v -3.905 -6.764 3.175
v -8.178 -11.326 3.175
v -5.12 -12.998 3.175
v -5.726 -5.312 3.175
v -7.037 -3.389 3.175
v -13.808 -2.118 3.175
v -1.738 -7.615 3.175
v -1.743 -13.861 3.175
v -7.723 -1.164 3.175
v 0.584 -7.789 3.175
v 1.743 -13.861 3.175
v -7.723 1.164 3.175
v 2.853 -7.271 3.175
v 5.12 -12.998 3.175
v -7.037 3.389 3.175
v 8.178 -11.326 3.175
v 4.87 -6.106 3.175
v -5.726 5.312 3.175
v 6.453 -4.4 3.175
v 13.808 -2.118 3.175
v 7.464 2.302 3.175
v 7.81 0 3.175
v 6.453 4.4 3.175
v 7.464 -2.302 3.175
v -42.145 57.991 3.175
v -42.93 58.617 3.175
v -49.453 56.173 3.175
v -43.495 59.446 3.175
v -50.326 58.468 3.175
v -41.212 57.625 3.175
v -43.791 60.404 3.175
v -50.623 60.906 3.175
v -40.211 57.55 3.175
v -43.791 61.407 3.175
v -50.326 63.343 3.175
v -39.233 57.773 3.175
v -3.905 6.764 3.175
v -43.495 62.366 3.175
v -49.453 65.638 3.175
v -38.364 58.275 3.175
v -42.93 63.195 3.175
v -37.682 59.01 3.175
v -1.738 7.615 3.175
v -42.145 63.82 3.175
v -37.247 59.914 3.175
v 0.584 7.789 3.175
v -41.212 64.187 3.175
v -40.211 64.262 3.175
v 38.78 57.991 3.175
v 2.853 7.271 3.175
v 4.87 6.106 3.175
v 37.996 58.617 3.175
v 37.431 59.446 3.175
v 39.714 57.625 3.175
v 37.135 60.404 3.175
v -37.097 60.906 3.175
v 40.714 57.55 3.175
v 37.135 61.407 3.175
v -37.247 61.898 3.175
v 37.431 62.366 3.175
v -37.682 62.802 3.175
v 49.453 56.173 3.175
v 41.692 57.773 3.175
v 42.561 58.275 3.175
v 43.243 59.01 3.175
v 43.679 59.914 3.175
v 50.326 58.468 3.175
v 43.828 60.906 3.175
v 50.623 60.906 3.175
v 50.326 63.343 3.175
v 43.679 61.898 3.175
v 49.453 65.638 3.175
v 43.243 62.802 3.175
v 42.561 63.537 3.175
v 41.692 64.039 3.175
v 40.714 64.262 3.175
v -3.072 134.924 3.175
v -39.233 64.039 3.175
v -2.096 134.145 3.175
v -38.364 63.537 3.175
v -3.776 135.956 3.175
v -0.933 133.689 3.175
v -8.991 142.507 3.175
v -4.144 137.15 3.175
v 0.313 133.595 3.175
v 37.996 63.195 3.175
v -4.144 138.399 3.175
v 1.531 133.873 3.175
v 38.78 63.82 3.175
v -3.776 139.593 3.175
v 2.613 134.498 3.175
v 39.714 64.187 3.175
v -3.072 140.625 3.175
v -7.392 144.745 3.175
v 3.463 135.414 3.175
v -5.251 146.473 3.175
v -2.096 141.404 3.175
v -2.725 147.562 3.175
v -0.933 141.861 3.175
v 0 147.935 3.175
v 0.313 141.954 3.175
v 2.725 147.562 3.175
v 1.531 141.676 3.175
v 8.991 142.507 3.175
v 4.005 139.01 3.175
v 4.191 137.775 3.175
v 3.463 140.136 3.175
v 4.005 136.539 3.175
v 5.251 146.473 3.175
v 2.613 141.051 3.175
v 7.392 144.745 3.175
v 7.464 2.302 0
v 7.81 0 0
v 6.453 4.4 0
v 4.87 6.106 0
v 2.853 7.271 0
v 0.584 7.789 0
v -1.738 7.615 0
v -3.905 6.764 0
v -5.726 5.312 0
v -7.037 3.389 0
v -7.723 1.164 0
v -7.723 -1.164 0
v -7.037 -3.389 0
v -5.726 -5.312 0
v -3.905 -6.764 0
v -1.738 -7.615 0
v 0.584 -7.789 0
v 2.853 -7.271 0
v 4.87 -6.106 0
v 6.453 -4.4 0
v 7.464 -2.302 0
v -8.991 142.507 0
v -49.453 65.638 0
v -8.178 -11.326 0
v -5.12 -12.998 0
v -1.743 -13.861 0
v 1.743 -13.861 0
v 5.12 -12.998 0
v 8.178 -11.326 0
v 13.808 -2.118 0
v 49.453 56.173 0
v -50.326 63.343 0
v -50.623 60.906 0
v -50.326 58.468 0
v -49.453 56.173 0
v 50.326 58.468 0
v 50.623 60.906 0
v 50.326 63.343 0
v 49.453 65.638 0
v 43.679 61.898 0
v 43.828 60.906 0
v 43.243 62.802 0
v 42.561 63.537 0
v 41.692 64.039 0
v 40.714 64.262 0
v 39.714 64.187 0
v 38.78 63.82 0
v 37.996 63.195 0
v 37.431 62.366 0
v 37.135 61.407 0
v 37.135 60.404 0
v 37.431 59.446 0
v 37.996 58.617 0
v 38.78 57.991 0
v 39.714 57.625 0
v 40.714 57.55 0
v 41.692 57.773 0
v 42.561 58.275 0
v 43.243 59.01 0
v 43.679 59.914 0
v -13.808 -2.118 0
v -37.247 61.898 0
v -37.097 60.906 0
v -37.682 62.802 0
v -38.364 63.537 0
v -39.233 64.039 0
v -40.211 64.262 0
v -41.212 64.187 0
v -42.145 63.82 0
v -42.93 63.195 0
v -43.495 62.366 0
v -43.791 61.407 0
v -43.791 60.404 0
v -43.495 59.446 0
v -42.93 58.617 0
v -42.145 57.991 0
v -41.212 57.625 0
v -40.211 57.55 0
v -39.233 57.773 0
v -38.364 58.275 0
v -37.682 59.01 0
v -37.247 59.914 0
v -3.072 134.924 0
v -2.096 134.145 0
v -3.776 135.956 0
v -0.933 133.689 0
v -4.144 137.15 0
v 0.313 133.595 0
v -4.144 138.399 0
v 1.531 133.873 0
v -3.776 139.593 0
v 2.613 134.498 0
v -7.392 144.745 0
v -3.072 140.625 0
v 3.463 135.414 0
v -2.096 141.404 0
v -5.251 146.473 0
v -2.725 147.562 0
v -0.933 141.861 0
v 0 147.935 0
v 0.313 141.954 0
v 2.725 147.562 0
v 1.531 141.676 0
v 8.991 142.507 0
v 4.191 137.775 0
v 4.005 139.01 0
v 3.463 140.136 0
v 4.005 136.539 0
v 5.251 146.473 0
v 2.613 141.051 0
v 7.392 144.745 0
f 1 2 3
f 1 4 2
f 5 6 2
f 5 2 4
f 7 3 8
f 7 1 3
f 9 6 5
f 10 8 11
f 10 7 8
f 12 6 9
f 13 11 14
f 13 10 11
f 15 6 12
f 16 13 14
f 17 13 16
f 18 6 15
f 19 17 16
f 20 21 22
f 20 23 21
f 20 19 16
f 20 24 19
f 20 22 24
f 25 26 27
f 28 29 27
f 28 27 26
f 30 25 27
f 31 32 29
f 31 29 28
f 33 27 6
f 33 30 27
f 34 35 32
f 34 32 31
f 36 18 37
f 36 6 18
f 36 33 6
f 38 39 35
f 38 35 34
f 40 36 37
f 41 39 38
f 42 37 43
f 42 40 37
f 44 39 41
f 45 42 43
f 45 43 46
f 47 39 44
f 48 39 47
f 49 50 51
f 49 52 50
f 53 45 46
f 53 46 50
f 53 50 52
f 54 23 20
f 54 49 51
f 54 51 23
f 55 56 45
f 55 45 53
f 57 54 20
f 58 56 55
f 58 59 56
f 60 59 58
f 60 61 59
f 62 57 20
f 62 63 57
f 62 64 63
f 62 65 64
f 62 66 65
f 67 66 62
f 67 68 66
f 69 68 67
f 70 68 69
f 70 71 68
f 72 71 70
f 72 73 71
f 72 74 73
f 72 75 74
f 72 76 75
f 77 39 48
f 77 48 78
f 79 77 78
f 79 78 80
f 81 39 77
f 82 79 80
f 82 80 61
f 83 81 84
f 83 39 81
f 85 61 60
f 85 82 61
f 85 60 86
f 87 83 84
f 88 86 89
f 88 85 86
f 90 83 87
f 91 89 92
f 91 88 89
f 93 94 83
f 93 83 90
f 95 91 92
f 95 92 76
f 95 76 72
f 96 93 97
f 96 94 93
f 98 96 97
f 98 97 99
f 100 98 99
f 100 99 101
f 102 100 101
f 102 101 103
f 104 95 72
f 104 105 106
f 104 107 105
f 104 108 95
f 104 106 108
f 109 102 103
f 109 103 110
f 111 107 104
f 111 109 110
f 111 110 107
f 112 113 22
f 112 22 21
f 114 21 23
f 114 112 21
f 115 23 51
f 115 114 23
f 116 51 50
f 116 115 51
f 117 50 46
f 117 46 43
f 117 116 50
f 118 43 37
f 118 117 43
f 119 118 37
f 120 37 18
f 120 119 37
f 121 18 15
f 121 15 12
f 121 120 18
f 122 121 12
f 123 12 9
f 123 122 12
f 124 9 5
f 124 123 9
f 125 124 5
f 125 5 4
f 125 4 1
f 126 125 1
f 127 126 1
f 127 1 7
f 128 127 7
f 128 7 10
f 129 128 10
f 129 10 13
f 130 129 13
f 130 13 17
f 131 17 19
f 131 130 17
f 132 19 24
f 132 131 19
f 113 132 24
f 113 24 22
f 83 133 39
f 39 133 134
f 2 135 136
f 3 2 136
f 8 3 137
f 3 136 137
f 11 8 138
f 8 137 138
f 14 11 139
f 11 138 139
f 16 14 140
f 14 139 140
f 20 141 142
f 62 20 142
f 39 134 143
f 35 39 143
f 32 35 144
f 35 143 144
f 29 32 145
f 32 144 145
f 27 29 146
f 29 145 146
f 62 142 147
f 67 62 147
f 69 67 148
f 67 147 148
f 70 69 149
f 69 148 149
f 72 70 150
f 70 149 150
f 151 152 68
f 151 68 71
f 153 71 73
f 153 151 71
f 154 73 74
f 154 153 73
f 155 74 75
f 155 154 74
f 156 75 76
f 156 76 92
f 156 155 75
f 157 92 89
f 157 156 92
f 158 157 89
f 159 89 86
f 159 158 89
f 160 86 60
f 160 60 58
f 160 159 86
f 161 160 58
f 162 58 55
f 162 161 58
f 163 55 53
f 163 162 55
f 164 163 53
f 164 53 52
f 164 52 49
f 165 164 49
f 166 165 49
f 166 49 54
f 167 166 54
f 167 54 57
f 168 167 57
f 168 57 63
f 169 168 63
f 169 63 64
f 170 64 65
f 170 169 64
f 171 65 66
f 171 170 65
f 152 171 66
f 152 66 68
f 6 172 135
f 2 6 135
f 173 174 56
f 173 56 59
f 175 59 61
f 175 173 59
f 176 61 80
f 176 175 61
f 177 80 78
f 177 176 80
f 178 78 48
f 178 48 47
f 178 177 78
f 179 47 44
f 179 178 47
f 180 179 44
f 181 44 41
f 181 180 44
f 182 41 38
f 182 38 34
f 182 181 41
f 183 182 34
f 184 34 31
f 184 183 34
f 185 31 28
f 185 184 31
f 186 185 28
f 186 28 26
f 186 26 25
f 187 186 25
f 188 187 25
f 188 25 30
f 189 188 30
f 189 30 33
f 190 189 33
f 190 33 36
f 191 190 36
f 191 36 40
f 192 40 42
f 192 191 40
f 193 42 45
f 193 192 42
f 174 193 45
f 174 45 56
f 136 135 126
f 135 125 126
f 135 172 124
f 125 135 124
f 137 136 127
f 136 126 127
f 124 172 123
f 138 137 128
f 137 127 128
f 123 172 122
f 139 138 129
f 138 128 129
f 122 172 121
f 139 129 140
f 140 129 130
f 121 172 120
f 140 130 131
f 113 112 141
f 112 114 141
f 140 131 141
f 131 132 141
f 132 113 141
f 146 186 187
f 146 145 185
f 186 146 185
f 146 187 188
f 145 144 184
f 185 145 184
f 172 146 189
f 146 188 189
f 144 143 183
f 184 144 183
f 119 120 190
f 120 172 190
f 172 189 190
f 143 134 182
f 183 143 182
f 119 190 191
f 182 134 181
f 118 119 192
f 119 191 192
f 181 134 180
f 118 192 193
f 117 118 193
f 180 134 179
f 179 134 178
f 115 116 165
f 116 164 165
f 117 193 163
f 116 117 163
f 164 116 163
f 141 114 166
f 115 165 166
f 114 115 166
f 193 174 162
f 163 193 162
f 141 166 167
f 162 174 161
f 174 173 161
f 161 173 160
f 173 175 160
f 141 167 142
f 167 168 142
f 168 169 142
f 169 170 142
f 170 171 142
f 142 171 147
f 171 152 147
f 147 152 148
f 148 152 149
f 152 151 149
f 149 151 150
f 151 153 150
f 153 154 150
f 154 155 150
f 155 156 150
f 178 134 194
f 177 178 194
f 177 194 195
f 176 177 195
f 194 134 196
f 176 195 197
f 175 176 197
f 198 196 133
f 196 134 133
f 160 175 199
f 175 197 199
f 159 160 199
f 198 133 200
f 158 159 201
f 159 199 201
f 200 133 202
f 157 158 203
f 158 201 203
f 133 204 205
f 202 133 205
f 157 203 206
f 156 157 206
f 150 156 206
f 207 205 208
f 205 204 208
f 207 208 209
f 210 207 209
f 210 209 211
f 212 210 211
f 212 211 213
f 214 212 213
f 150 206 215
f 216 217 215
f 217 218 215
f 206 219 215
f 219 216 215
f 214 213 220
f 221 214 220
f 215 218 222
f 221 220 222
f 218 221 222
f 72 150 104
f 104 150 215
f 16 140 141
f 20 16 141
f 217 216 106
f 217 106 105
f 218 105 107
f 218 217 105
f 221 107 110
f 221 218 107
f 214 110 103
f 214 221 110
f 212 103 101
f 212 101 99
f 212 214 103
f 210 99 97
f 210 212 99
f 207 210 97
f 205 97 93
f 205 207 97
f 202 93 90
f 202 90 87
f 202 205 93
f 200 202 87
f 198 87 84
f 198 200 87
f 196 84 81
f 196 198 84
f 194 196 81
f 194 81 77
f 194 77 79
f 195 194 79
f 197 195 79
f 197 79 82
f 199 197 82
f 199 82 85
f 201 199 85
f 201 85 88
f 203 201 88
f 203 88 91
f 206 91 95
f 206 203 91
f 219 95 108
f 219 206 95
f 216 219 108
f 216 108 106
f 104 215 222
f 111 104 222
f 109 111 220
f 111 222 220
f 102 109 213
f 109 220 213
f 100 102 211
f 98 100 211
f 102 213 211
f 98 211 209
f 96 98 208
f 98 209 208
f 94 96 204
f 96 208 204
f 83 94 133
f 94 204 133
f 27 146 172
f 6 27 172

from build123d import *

# Parameters (mm, degrees)
SKETCH4_R           = 3.3655
SKETCH4_R_2         = 7.8105
SKETCH4_R_3         = 4.191
BOSS_EXTRUDE4_DEPTH = 3.175


with BuildPart() as part:
    # Sketch4 → Boss-Extrude4 (new body)
    # profile 1 of 3: a face of its own
    with BuildSketch(Plane.XY):
        with BuildLine():
            ThreePointArc((-10.16, 137.77468), (-9.863294022, 140.212103033), (-8.990505701, 142.507164257))
            Line((-8.990505701, 142.507164257), (-49.453246099, 65.638340515))
            ThreePointArc((-49.453246099, 65.638340515), (-50.622740399, 60.905856258), (-49.453246099, 56.173372001))
            Line((-49.453246099, 56.173372001), (-13.808489628, -2.118139324))
            ThreePointArc((-13.808489628, -2.118139324), (-13.929563886, -1.062144034), (-13.97, 0))
            Line((-13.97, 0), (-10.16, 137.77468))
        make_face()
        with Locations((-40.462740399, 60.905856258)):
            Circle(SKETCH4_R, mode=Mode.SUBTRACT)
    # profile 2 of 3: a face of its own
    with BuildSketch(Plane.XY):
        with BuildLine():
            ThreePointArc((49.453246099, 56.173372001), (50.622740399, 60.905856258), (49.453246099, 65.638340515))
            Line((49.453246099, 65.638340515), (8.990505701, 142.507164257))
            ThreePointArc((8.990505701, 142.507164257), (9.863294022, 140.212103033), (10.16, 137.77468))
            Line((10.16, 137.77468), (13.97, 0))
            ThreePointArc((13.97, 0), (13.929563886, -1.062144034), (13.808489628, -2.118139324))
            Line((13.808489628, -2.118139324), (49.453246099, 56.173372001))
        make_face()
        with Locations((40.462740399, 60.905856258)):
            Circle(SKETCH4_R, mode=Mode.SUBTRACT)
    # profile 3 of 3: a face of its own
    with BuildSketch(Plane.XY):
        with BuildLine():
            ThreePointArc((10.16, 137.77468), (9.863294022, 140.212103033), (8.990505701, 142.507164257))
            ThreePointArc((8.990505701, 142.507164257), (0, 147.93468), (-8.990505701, 142.507164257))
            ThreePointArc((-8.990505701, 142.507164257), (-9.863294022, 140.212103033), (-10.16, 137.77468))
            Line((-10.16, 137.77468), (-13.97, 0))
            ThreePointArc((-13.97, 0), (-13.929563886, -1.062144034), (-13.808489628, -2.118139324))
            Line((-13.808489628, -2.118139324), (-8.177790267, -11.326281223))
            ThreePointArc((-8.177790267, -11.326281223), (0, -13.97), (8.177790267, -11.326281223))
            Line((8.177790267, -11.326281223), (13.808489628, -2.118139324))
            ThreePointArc((13.808489628, -2.118139324), (13.929563886, -1.062144034), (13.97, 0))
            Line((13.97, 0), (10.16, 137.77468))
        make_face()
        Circle(SKETCH4_R_2, mode=Mode.SUBTRACT)
        with Locations((0, 137.77468)):
            Circle(SKETCH4_R_3, mode=Mode.SUBTRACT)
    extrude(amount=BOSS_EXTRUDE4_DEPTH)


solid = part.part
